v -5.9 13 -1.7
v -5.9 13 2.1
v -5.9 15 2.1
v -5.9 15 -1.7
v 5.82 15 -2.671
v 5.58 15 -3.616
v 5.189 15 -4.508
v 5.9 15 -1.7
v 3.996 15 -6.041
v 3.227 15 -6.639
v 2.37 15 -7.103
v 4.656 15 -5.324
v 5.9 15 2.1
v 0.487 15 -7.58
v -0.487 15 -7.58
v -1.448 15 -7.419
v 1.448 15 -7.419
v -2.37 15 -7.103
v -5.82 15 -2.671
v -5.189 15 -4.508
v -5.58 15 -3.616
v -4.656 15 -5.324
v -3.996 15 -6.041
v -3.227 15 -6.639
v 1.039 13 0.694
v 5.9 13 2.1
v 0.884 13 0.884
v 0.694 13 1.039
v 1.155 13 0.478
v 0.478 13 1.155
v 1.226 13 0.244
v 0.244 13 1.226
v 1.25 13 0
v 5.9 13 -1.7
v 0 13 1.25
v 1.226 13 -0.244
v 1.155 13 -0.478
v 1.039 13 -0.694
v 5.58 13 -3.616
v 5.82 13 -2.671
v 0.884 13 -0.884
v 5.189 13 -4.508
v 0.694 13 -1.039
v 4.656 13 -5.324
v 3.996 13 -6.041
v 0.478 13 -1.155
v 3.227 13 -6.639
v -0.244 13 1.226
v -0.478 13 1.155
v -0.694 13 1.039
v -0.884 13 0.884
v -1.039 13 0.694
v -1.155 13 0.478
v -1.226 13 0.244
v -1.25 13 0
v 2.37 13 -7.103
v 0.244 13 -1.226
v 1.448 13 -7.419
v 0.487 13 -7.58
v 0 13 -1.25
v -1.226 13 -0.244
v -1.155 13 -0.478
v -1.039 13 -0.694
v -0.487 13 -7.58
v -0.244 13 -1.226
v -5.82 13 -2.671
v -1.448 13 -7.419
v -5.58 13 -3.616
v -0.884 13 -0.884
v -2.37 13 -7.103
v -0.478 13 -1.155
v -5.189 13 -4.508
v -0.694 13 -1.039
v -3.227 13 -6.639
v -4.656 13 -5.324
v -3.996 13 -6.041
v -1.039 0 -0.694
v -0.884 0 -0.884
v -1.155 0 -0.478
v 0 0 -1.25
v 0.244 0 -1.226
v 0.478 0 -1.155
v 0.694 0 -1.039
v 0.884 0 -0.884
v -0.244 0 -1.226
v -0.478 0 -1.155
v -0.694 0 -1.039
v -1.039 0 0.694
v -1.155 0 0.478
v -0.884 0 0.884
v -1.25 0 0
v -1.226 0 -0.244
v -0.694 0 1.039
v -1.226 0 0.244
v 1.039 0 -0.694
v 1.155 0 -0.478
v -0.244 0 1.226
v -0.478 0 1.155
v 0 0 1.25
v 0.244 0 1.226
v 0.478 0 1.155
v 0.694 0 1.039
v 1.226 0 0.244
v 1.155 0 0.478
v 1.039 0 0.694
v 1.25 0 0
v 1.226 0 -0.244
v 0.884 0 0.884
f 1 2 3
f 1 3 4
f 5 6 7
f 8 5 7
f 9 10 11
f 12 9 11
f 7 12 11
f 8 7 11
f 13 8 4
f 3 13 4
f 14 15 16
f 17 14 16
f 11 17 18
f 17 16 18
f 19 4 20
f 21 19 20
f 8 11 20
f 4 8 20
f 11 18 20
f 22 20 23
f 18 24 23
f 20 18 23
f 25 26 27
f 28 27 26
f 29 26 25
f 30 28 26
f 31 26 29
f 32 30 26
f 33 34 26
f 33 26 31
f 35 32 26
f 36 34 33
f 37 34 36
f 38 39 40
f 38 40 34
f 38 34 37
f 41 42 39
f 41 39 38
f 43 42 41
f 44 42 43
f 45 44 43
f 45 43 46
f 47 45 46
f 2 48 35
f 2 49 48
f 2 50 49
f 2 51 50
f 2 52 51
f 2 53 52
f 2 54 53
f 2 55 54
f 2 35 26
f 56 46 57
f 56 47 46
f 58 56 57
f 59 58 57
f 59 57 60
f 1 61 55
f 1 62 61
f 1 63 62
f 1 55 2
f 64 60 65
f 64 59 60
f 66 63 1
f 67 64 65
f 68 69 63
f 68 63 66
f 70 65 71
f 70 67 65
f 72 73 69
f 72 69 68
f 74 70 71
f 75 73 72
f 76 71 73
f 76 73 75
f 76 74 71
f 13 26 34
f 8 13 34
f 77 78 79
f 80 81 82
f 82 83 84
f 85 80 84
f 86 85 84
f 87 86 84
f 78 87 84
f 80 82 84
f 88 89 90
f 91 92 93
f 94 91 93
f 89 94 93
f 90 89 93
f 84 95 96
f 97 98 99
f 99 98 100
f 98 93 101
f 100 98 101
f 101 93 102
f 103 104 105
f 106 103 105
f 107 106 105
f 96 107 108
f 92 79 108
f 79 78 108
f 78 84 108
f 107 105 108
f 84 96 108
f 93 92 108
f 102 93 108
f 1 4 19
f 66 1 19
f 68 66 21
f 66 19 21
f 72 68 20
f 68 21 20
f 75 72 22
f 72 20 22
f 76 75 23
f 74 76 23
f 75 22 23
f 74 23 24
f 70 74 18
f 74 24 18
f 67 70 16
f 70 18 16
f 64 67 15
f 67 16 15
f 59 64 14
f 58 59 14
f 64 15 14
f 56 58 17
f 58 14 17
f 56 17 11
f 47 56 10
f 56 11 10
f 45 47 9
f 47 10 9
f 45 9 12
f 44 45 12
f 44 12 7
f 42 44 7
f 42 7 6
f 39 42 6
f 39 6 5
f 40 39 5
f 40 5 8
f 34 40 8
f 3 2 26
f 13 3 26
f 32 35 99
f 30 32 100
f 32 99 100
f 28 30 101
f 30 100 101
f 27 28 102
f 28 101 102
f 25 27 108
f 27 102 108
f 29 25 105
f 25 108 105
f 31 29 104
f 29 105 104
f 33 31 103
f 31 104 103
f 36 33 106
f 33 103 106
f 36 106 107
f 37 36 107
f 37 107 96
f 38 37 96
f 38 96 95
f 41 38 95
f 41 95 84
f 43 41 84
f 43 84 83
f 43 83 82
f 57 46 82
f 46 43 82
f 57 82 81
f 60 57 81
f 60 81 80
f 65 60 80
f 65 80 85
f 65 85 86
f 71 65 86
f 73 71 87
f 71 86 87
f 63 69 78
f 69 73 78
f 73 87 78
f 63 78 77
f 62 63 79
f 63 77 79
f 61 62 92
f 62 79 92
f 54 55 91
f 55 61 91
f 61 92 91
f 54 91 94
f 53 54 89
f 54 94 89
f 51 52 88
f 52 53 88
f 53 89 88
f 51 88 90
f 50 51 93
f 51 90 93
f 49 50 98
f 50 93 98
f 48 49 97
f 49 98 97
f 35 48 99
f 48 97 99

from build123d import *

# Parameters (mm, degrees)
SKETCH1_R                = 1.25
BOSS_EXTRUDE1_DEPTH      = 14
BOSS_EXTRUDE2_DEPTH      = 1
BOSS_EXTRUDE2_DEPTH_BACK = 1
SKETCH3_W                = 11.8
SKETCH3_H                = 3.8
BOSS_EXTRUDE3_DEPTH      = 2


with BuildPart() as part:
    # Sketch1 → Boss-Extrude1 (new body)
    with BuildSketch(Plane(origin=(0, 0, 0), x_dir=(1, 0, 0), z_dir=(0, 1, 0))):
        with Locations(Location((0, 0, 0), (0, 0, 270))):
            Circle(SKETCH1_R)
    extrude(amount=BOSS_EXTRUDE1_DEPTH)

    # Sketch3 → Boss-Extrude2 (add, two sides: drawn at the far end of the back side and taken through both)
    with BuildSketch(Plane(origin=(0, 14, 0), x_dir=(1, 0, 0), z_dir=(0, 1, 0)).offset(-BOSS_EXTRUDE2_DEPTH_BACK)):
        with Locations((1e-09, -0.2)):
            Rectangle(SKETCH3_W, SKETCH3_H)
    extrude(amount=BOSS_EXTRUDE2_DEPTH + BOSS_EXTRUDE2_DEPTH_BACK)

    # Sketch4 → Boss-Extrude3 (add)
    with BuildSketch(Plane(origin=(0, 15, 0), x_dir=(1, 0, 0), z_dir=(0, 1, 0))):
        with BuildLine():
            Line((5.900000001, 1.7), (-5.899999999, 1.7))
            ThreePointArc((-5.899999999, 1.7), (1e-09, 7.6), (5.900000001, 1.7))
        make_face()
    extrude(amount=-BOSS_EXTRUDE3_DEPTH)


solid = part.part
